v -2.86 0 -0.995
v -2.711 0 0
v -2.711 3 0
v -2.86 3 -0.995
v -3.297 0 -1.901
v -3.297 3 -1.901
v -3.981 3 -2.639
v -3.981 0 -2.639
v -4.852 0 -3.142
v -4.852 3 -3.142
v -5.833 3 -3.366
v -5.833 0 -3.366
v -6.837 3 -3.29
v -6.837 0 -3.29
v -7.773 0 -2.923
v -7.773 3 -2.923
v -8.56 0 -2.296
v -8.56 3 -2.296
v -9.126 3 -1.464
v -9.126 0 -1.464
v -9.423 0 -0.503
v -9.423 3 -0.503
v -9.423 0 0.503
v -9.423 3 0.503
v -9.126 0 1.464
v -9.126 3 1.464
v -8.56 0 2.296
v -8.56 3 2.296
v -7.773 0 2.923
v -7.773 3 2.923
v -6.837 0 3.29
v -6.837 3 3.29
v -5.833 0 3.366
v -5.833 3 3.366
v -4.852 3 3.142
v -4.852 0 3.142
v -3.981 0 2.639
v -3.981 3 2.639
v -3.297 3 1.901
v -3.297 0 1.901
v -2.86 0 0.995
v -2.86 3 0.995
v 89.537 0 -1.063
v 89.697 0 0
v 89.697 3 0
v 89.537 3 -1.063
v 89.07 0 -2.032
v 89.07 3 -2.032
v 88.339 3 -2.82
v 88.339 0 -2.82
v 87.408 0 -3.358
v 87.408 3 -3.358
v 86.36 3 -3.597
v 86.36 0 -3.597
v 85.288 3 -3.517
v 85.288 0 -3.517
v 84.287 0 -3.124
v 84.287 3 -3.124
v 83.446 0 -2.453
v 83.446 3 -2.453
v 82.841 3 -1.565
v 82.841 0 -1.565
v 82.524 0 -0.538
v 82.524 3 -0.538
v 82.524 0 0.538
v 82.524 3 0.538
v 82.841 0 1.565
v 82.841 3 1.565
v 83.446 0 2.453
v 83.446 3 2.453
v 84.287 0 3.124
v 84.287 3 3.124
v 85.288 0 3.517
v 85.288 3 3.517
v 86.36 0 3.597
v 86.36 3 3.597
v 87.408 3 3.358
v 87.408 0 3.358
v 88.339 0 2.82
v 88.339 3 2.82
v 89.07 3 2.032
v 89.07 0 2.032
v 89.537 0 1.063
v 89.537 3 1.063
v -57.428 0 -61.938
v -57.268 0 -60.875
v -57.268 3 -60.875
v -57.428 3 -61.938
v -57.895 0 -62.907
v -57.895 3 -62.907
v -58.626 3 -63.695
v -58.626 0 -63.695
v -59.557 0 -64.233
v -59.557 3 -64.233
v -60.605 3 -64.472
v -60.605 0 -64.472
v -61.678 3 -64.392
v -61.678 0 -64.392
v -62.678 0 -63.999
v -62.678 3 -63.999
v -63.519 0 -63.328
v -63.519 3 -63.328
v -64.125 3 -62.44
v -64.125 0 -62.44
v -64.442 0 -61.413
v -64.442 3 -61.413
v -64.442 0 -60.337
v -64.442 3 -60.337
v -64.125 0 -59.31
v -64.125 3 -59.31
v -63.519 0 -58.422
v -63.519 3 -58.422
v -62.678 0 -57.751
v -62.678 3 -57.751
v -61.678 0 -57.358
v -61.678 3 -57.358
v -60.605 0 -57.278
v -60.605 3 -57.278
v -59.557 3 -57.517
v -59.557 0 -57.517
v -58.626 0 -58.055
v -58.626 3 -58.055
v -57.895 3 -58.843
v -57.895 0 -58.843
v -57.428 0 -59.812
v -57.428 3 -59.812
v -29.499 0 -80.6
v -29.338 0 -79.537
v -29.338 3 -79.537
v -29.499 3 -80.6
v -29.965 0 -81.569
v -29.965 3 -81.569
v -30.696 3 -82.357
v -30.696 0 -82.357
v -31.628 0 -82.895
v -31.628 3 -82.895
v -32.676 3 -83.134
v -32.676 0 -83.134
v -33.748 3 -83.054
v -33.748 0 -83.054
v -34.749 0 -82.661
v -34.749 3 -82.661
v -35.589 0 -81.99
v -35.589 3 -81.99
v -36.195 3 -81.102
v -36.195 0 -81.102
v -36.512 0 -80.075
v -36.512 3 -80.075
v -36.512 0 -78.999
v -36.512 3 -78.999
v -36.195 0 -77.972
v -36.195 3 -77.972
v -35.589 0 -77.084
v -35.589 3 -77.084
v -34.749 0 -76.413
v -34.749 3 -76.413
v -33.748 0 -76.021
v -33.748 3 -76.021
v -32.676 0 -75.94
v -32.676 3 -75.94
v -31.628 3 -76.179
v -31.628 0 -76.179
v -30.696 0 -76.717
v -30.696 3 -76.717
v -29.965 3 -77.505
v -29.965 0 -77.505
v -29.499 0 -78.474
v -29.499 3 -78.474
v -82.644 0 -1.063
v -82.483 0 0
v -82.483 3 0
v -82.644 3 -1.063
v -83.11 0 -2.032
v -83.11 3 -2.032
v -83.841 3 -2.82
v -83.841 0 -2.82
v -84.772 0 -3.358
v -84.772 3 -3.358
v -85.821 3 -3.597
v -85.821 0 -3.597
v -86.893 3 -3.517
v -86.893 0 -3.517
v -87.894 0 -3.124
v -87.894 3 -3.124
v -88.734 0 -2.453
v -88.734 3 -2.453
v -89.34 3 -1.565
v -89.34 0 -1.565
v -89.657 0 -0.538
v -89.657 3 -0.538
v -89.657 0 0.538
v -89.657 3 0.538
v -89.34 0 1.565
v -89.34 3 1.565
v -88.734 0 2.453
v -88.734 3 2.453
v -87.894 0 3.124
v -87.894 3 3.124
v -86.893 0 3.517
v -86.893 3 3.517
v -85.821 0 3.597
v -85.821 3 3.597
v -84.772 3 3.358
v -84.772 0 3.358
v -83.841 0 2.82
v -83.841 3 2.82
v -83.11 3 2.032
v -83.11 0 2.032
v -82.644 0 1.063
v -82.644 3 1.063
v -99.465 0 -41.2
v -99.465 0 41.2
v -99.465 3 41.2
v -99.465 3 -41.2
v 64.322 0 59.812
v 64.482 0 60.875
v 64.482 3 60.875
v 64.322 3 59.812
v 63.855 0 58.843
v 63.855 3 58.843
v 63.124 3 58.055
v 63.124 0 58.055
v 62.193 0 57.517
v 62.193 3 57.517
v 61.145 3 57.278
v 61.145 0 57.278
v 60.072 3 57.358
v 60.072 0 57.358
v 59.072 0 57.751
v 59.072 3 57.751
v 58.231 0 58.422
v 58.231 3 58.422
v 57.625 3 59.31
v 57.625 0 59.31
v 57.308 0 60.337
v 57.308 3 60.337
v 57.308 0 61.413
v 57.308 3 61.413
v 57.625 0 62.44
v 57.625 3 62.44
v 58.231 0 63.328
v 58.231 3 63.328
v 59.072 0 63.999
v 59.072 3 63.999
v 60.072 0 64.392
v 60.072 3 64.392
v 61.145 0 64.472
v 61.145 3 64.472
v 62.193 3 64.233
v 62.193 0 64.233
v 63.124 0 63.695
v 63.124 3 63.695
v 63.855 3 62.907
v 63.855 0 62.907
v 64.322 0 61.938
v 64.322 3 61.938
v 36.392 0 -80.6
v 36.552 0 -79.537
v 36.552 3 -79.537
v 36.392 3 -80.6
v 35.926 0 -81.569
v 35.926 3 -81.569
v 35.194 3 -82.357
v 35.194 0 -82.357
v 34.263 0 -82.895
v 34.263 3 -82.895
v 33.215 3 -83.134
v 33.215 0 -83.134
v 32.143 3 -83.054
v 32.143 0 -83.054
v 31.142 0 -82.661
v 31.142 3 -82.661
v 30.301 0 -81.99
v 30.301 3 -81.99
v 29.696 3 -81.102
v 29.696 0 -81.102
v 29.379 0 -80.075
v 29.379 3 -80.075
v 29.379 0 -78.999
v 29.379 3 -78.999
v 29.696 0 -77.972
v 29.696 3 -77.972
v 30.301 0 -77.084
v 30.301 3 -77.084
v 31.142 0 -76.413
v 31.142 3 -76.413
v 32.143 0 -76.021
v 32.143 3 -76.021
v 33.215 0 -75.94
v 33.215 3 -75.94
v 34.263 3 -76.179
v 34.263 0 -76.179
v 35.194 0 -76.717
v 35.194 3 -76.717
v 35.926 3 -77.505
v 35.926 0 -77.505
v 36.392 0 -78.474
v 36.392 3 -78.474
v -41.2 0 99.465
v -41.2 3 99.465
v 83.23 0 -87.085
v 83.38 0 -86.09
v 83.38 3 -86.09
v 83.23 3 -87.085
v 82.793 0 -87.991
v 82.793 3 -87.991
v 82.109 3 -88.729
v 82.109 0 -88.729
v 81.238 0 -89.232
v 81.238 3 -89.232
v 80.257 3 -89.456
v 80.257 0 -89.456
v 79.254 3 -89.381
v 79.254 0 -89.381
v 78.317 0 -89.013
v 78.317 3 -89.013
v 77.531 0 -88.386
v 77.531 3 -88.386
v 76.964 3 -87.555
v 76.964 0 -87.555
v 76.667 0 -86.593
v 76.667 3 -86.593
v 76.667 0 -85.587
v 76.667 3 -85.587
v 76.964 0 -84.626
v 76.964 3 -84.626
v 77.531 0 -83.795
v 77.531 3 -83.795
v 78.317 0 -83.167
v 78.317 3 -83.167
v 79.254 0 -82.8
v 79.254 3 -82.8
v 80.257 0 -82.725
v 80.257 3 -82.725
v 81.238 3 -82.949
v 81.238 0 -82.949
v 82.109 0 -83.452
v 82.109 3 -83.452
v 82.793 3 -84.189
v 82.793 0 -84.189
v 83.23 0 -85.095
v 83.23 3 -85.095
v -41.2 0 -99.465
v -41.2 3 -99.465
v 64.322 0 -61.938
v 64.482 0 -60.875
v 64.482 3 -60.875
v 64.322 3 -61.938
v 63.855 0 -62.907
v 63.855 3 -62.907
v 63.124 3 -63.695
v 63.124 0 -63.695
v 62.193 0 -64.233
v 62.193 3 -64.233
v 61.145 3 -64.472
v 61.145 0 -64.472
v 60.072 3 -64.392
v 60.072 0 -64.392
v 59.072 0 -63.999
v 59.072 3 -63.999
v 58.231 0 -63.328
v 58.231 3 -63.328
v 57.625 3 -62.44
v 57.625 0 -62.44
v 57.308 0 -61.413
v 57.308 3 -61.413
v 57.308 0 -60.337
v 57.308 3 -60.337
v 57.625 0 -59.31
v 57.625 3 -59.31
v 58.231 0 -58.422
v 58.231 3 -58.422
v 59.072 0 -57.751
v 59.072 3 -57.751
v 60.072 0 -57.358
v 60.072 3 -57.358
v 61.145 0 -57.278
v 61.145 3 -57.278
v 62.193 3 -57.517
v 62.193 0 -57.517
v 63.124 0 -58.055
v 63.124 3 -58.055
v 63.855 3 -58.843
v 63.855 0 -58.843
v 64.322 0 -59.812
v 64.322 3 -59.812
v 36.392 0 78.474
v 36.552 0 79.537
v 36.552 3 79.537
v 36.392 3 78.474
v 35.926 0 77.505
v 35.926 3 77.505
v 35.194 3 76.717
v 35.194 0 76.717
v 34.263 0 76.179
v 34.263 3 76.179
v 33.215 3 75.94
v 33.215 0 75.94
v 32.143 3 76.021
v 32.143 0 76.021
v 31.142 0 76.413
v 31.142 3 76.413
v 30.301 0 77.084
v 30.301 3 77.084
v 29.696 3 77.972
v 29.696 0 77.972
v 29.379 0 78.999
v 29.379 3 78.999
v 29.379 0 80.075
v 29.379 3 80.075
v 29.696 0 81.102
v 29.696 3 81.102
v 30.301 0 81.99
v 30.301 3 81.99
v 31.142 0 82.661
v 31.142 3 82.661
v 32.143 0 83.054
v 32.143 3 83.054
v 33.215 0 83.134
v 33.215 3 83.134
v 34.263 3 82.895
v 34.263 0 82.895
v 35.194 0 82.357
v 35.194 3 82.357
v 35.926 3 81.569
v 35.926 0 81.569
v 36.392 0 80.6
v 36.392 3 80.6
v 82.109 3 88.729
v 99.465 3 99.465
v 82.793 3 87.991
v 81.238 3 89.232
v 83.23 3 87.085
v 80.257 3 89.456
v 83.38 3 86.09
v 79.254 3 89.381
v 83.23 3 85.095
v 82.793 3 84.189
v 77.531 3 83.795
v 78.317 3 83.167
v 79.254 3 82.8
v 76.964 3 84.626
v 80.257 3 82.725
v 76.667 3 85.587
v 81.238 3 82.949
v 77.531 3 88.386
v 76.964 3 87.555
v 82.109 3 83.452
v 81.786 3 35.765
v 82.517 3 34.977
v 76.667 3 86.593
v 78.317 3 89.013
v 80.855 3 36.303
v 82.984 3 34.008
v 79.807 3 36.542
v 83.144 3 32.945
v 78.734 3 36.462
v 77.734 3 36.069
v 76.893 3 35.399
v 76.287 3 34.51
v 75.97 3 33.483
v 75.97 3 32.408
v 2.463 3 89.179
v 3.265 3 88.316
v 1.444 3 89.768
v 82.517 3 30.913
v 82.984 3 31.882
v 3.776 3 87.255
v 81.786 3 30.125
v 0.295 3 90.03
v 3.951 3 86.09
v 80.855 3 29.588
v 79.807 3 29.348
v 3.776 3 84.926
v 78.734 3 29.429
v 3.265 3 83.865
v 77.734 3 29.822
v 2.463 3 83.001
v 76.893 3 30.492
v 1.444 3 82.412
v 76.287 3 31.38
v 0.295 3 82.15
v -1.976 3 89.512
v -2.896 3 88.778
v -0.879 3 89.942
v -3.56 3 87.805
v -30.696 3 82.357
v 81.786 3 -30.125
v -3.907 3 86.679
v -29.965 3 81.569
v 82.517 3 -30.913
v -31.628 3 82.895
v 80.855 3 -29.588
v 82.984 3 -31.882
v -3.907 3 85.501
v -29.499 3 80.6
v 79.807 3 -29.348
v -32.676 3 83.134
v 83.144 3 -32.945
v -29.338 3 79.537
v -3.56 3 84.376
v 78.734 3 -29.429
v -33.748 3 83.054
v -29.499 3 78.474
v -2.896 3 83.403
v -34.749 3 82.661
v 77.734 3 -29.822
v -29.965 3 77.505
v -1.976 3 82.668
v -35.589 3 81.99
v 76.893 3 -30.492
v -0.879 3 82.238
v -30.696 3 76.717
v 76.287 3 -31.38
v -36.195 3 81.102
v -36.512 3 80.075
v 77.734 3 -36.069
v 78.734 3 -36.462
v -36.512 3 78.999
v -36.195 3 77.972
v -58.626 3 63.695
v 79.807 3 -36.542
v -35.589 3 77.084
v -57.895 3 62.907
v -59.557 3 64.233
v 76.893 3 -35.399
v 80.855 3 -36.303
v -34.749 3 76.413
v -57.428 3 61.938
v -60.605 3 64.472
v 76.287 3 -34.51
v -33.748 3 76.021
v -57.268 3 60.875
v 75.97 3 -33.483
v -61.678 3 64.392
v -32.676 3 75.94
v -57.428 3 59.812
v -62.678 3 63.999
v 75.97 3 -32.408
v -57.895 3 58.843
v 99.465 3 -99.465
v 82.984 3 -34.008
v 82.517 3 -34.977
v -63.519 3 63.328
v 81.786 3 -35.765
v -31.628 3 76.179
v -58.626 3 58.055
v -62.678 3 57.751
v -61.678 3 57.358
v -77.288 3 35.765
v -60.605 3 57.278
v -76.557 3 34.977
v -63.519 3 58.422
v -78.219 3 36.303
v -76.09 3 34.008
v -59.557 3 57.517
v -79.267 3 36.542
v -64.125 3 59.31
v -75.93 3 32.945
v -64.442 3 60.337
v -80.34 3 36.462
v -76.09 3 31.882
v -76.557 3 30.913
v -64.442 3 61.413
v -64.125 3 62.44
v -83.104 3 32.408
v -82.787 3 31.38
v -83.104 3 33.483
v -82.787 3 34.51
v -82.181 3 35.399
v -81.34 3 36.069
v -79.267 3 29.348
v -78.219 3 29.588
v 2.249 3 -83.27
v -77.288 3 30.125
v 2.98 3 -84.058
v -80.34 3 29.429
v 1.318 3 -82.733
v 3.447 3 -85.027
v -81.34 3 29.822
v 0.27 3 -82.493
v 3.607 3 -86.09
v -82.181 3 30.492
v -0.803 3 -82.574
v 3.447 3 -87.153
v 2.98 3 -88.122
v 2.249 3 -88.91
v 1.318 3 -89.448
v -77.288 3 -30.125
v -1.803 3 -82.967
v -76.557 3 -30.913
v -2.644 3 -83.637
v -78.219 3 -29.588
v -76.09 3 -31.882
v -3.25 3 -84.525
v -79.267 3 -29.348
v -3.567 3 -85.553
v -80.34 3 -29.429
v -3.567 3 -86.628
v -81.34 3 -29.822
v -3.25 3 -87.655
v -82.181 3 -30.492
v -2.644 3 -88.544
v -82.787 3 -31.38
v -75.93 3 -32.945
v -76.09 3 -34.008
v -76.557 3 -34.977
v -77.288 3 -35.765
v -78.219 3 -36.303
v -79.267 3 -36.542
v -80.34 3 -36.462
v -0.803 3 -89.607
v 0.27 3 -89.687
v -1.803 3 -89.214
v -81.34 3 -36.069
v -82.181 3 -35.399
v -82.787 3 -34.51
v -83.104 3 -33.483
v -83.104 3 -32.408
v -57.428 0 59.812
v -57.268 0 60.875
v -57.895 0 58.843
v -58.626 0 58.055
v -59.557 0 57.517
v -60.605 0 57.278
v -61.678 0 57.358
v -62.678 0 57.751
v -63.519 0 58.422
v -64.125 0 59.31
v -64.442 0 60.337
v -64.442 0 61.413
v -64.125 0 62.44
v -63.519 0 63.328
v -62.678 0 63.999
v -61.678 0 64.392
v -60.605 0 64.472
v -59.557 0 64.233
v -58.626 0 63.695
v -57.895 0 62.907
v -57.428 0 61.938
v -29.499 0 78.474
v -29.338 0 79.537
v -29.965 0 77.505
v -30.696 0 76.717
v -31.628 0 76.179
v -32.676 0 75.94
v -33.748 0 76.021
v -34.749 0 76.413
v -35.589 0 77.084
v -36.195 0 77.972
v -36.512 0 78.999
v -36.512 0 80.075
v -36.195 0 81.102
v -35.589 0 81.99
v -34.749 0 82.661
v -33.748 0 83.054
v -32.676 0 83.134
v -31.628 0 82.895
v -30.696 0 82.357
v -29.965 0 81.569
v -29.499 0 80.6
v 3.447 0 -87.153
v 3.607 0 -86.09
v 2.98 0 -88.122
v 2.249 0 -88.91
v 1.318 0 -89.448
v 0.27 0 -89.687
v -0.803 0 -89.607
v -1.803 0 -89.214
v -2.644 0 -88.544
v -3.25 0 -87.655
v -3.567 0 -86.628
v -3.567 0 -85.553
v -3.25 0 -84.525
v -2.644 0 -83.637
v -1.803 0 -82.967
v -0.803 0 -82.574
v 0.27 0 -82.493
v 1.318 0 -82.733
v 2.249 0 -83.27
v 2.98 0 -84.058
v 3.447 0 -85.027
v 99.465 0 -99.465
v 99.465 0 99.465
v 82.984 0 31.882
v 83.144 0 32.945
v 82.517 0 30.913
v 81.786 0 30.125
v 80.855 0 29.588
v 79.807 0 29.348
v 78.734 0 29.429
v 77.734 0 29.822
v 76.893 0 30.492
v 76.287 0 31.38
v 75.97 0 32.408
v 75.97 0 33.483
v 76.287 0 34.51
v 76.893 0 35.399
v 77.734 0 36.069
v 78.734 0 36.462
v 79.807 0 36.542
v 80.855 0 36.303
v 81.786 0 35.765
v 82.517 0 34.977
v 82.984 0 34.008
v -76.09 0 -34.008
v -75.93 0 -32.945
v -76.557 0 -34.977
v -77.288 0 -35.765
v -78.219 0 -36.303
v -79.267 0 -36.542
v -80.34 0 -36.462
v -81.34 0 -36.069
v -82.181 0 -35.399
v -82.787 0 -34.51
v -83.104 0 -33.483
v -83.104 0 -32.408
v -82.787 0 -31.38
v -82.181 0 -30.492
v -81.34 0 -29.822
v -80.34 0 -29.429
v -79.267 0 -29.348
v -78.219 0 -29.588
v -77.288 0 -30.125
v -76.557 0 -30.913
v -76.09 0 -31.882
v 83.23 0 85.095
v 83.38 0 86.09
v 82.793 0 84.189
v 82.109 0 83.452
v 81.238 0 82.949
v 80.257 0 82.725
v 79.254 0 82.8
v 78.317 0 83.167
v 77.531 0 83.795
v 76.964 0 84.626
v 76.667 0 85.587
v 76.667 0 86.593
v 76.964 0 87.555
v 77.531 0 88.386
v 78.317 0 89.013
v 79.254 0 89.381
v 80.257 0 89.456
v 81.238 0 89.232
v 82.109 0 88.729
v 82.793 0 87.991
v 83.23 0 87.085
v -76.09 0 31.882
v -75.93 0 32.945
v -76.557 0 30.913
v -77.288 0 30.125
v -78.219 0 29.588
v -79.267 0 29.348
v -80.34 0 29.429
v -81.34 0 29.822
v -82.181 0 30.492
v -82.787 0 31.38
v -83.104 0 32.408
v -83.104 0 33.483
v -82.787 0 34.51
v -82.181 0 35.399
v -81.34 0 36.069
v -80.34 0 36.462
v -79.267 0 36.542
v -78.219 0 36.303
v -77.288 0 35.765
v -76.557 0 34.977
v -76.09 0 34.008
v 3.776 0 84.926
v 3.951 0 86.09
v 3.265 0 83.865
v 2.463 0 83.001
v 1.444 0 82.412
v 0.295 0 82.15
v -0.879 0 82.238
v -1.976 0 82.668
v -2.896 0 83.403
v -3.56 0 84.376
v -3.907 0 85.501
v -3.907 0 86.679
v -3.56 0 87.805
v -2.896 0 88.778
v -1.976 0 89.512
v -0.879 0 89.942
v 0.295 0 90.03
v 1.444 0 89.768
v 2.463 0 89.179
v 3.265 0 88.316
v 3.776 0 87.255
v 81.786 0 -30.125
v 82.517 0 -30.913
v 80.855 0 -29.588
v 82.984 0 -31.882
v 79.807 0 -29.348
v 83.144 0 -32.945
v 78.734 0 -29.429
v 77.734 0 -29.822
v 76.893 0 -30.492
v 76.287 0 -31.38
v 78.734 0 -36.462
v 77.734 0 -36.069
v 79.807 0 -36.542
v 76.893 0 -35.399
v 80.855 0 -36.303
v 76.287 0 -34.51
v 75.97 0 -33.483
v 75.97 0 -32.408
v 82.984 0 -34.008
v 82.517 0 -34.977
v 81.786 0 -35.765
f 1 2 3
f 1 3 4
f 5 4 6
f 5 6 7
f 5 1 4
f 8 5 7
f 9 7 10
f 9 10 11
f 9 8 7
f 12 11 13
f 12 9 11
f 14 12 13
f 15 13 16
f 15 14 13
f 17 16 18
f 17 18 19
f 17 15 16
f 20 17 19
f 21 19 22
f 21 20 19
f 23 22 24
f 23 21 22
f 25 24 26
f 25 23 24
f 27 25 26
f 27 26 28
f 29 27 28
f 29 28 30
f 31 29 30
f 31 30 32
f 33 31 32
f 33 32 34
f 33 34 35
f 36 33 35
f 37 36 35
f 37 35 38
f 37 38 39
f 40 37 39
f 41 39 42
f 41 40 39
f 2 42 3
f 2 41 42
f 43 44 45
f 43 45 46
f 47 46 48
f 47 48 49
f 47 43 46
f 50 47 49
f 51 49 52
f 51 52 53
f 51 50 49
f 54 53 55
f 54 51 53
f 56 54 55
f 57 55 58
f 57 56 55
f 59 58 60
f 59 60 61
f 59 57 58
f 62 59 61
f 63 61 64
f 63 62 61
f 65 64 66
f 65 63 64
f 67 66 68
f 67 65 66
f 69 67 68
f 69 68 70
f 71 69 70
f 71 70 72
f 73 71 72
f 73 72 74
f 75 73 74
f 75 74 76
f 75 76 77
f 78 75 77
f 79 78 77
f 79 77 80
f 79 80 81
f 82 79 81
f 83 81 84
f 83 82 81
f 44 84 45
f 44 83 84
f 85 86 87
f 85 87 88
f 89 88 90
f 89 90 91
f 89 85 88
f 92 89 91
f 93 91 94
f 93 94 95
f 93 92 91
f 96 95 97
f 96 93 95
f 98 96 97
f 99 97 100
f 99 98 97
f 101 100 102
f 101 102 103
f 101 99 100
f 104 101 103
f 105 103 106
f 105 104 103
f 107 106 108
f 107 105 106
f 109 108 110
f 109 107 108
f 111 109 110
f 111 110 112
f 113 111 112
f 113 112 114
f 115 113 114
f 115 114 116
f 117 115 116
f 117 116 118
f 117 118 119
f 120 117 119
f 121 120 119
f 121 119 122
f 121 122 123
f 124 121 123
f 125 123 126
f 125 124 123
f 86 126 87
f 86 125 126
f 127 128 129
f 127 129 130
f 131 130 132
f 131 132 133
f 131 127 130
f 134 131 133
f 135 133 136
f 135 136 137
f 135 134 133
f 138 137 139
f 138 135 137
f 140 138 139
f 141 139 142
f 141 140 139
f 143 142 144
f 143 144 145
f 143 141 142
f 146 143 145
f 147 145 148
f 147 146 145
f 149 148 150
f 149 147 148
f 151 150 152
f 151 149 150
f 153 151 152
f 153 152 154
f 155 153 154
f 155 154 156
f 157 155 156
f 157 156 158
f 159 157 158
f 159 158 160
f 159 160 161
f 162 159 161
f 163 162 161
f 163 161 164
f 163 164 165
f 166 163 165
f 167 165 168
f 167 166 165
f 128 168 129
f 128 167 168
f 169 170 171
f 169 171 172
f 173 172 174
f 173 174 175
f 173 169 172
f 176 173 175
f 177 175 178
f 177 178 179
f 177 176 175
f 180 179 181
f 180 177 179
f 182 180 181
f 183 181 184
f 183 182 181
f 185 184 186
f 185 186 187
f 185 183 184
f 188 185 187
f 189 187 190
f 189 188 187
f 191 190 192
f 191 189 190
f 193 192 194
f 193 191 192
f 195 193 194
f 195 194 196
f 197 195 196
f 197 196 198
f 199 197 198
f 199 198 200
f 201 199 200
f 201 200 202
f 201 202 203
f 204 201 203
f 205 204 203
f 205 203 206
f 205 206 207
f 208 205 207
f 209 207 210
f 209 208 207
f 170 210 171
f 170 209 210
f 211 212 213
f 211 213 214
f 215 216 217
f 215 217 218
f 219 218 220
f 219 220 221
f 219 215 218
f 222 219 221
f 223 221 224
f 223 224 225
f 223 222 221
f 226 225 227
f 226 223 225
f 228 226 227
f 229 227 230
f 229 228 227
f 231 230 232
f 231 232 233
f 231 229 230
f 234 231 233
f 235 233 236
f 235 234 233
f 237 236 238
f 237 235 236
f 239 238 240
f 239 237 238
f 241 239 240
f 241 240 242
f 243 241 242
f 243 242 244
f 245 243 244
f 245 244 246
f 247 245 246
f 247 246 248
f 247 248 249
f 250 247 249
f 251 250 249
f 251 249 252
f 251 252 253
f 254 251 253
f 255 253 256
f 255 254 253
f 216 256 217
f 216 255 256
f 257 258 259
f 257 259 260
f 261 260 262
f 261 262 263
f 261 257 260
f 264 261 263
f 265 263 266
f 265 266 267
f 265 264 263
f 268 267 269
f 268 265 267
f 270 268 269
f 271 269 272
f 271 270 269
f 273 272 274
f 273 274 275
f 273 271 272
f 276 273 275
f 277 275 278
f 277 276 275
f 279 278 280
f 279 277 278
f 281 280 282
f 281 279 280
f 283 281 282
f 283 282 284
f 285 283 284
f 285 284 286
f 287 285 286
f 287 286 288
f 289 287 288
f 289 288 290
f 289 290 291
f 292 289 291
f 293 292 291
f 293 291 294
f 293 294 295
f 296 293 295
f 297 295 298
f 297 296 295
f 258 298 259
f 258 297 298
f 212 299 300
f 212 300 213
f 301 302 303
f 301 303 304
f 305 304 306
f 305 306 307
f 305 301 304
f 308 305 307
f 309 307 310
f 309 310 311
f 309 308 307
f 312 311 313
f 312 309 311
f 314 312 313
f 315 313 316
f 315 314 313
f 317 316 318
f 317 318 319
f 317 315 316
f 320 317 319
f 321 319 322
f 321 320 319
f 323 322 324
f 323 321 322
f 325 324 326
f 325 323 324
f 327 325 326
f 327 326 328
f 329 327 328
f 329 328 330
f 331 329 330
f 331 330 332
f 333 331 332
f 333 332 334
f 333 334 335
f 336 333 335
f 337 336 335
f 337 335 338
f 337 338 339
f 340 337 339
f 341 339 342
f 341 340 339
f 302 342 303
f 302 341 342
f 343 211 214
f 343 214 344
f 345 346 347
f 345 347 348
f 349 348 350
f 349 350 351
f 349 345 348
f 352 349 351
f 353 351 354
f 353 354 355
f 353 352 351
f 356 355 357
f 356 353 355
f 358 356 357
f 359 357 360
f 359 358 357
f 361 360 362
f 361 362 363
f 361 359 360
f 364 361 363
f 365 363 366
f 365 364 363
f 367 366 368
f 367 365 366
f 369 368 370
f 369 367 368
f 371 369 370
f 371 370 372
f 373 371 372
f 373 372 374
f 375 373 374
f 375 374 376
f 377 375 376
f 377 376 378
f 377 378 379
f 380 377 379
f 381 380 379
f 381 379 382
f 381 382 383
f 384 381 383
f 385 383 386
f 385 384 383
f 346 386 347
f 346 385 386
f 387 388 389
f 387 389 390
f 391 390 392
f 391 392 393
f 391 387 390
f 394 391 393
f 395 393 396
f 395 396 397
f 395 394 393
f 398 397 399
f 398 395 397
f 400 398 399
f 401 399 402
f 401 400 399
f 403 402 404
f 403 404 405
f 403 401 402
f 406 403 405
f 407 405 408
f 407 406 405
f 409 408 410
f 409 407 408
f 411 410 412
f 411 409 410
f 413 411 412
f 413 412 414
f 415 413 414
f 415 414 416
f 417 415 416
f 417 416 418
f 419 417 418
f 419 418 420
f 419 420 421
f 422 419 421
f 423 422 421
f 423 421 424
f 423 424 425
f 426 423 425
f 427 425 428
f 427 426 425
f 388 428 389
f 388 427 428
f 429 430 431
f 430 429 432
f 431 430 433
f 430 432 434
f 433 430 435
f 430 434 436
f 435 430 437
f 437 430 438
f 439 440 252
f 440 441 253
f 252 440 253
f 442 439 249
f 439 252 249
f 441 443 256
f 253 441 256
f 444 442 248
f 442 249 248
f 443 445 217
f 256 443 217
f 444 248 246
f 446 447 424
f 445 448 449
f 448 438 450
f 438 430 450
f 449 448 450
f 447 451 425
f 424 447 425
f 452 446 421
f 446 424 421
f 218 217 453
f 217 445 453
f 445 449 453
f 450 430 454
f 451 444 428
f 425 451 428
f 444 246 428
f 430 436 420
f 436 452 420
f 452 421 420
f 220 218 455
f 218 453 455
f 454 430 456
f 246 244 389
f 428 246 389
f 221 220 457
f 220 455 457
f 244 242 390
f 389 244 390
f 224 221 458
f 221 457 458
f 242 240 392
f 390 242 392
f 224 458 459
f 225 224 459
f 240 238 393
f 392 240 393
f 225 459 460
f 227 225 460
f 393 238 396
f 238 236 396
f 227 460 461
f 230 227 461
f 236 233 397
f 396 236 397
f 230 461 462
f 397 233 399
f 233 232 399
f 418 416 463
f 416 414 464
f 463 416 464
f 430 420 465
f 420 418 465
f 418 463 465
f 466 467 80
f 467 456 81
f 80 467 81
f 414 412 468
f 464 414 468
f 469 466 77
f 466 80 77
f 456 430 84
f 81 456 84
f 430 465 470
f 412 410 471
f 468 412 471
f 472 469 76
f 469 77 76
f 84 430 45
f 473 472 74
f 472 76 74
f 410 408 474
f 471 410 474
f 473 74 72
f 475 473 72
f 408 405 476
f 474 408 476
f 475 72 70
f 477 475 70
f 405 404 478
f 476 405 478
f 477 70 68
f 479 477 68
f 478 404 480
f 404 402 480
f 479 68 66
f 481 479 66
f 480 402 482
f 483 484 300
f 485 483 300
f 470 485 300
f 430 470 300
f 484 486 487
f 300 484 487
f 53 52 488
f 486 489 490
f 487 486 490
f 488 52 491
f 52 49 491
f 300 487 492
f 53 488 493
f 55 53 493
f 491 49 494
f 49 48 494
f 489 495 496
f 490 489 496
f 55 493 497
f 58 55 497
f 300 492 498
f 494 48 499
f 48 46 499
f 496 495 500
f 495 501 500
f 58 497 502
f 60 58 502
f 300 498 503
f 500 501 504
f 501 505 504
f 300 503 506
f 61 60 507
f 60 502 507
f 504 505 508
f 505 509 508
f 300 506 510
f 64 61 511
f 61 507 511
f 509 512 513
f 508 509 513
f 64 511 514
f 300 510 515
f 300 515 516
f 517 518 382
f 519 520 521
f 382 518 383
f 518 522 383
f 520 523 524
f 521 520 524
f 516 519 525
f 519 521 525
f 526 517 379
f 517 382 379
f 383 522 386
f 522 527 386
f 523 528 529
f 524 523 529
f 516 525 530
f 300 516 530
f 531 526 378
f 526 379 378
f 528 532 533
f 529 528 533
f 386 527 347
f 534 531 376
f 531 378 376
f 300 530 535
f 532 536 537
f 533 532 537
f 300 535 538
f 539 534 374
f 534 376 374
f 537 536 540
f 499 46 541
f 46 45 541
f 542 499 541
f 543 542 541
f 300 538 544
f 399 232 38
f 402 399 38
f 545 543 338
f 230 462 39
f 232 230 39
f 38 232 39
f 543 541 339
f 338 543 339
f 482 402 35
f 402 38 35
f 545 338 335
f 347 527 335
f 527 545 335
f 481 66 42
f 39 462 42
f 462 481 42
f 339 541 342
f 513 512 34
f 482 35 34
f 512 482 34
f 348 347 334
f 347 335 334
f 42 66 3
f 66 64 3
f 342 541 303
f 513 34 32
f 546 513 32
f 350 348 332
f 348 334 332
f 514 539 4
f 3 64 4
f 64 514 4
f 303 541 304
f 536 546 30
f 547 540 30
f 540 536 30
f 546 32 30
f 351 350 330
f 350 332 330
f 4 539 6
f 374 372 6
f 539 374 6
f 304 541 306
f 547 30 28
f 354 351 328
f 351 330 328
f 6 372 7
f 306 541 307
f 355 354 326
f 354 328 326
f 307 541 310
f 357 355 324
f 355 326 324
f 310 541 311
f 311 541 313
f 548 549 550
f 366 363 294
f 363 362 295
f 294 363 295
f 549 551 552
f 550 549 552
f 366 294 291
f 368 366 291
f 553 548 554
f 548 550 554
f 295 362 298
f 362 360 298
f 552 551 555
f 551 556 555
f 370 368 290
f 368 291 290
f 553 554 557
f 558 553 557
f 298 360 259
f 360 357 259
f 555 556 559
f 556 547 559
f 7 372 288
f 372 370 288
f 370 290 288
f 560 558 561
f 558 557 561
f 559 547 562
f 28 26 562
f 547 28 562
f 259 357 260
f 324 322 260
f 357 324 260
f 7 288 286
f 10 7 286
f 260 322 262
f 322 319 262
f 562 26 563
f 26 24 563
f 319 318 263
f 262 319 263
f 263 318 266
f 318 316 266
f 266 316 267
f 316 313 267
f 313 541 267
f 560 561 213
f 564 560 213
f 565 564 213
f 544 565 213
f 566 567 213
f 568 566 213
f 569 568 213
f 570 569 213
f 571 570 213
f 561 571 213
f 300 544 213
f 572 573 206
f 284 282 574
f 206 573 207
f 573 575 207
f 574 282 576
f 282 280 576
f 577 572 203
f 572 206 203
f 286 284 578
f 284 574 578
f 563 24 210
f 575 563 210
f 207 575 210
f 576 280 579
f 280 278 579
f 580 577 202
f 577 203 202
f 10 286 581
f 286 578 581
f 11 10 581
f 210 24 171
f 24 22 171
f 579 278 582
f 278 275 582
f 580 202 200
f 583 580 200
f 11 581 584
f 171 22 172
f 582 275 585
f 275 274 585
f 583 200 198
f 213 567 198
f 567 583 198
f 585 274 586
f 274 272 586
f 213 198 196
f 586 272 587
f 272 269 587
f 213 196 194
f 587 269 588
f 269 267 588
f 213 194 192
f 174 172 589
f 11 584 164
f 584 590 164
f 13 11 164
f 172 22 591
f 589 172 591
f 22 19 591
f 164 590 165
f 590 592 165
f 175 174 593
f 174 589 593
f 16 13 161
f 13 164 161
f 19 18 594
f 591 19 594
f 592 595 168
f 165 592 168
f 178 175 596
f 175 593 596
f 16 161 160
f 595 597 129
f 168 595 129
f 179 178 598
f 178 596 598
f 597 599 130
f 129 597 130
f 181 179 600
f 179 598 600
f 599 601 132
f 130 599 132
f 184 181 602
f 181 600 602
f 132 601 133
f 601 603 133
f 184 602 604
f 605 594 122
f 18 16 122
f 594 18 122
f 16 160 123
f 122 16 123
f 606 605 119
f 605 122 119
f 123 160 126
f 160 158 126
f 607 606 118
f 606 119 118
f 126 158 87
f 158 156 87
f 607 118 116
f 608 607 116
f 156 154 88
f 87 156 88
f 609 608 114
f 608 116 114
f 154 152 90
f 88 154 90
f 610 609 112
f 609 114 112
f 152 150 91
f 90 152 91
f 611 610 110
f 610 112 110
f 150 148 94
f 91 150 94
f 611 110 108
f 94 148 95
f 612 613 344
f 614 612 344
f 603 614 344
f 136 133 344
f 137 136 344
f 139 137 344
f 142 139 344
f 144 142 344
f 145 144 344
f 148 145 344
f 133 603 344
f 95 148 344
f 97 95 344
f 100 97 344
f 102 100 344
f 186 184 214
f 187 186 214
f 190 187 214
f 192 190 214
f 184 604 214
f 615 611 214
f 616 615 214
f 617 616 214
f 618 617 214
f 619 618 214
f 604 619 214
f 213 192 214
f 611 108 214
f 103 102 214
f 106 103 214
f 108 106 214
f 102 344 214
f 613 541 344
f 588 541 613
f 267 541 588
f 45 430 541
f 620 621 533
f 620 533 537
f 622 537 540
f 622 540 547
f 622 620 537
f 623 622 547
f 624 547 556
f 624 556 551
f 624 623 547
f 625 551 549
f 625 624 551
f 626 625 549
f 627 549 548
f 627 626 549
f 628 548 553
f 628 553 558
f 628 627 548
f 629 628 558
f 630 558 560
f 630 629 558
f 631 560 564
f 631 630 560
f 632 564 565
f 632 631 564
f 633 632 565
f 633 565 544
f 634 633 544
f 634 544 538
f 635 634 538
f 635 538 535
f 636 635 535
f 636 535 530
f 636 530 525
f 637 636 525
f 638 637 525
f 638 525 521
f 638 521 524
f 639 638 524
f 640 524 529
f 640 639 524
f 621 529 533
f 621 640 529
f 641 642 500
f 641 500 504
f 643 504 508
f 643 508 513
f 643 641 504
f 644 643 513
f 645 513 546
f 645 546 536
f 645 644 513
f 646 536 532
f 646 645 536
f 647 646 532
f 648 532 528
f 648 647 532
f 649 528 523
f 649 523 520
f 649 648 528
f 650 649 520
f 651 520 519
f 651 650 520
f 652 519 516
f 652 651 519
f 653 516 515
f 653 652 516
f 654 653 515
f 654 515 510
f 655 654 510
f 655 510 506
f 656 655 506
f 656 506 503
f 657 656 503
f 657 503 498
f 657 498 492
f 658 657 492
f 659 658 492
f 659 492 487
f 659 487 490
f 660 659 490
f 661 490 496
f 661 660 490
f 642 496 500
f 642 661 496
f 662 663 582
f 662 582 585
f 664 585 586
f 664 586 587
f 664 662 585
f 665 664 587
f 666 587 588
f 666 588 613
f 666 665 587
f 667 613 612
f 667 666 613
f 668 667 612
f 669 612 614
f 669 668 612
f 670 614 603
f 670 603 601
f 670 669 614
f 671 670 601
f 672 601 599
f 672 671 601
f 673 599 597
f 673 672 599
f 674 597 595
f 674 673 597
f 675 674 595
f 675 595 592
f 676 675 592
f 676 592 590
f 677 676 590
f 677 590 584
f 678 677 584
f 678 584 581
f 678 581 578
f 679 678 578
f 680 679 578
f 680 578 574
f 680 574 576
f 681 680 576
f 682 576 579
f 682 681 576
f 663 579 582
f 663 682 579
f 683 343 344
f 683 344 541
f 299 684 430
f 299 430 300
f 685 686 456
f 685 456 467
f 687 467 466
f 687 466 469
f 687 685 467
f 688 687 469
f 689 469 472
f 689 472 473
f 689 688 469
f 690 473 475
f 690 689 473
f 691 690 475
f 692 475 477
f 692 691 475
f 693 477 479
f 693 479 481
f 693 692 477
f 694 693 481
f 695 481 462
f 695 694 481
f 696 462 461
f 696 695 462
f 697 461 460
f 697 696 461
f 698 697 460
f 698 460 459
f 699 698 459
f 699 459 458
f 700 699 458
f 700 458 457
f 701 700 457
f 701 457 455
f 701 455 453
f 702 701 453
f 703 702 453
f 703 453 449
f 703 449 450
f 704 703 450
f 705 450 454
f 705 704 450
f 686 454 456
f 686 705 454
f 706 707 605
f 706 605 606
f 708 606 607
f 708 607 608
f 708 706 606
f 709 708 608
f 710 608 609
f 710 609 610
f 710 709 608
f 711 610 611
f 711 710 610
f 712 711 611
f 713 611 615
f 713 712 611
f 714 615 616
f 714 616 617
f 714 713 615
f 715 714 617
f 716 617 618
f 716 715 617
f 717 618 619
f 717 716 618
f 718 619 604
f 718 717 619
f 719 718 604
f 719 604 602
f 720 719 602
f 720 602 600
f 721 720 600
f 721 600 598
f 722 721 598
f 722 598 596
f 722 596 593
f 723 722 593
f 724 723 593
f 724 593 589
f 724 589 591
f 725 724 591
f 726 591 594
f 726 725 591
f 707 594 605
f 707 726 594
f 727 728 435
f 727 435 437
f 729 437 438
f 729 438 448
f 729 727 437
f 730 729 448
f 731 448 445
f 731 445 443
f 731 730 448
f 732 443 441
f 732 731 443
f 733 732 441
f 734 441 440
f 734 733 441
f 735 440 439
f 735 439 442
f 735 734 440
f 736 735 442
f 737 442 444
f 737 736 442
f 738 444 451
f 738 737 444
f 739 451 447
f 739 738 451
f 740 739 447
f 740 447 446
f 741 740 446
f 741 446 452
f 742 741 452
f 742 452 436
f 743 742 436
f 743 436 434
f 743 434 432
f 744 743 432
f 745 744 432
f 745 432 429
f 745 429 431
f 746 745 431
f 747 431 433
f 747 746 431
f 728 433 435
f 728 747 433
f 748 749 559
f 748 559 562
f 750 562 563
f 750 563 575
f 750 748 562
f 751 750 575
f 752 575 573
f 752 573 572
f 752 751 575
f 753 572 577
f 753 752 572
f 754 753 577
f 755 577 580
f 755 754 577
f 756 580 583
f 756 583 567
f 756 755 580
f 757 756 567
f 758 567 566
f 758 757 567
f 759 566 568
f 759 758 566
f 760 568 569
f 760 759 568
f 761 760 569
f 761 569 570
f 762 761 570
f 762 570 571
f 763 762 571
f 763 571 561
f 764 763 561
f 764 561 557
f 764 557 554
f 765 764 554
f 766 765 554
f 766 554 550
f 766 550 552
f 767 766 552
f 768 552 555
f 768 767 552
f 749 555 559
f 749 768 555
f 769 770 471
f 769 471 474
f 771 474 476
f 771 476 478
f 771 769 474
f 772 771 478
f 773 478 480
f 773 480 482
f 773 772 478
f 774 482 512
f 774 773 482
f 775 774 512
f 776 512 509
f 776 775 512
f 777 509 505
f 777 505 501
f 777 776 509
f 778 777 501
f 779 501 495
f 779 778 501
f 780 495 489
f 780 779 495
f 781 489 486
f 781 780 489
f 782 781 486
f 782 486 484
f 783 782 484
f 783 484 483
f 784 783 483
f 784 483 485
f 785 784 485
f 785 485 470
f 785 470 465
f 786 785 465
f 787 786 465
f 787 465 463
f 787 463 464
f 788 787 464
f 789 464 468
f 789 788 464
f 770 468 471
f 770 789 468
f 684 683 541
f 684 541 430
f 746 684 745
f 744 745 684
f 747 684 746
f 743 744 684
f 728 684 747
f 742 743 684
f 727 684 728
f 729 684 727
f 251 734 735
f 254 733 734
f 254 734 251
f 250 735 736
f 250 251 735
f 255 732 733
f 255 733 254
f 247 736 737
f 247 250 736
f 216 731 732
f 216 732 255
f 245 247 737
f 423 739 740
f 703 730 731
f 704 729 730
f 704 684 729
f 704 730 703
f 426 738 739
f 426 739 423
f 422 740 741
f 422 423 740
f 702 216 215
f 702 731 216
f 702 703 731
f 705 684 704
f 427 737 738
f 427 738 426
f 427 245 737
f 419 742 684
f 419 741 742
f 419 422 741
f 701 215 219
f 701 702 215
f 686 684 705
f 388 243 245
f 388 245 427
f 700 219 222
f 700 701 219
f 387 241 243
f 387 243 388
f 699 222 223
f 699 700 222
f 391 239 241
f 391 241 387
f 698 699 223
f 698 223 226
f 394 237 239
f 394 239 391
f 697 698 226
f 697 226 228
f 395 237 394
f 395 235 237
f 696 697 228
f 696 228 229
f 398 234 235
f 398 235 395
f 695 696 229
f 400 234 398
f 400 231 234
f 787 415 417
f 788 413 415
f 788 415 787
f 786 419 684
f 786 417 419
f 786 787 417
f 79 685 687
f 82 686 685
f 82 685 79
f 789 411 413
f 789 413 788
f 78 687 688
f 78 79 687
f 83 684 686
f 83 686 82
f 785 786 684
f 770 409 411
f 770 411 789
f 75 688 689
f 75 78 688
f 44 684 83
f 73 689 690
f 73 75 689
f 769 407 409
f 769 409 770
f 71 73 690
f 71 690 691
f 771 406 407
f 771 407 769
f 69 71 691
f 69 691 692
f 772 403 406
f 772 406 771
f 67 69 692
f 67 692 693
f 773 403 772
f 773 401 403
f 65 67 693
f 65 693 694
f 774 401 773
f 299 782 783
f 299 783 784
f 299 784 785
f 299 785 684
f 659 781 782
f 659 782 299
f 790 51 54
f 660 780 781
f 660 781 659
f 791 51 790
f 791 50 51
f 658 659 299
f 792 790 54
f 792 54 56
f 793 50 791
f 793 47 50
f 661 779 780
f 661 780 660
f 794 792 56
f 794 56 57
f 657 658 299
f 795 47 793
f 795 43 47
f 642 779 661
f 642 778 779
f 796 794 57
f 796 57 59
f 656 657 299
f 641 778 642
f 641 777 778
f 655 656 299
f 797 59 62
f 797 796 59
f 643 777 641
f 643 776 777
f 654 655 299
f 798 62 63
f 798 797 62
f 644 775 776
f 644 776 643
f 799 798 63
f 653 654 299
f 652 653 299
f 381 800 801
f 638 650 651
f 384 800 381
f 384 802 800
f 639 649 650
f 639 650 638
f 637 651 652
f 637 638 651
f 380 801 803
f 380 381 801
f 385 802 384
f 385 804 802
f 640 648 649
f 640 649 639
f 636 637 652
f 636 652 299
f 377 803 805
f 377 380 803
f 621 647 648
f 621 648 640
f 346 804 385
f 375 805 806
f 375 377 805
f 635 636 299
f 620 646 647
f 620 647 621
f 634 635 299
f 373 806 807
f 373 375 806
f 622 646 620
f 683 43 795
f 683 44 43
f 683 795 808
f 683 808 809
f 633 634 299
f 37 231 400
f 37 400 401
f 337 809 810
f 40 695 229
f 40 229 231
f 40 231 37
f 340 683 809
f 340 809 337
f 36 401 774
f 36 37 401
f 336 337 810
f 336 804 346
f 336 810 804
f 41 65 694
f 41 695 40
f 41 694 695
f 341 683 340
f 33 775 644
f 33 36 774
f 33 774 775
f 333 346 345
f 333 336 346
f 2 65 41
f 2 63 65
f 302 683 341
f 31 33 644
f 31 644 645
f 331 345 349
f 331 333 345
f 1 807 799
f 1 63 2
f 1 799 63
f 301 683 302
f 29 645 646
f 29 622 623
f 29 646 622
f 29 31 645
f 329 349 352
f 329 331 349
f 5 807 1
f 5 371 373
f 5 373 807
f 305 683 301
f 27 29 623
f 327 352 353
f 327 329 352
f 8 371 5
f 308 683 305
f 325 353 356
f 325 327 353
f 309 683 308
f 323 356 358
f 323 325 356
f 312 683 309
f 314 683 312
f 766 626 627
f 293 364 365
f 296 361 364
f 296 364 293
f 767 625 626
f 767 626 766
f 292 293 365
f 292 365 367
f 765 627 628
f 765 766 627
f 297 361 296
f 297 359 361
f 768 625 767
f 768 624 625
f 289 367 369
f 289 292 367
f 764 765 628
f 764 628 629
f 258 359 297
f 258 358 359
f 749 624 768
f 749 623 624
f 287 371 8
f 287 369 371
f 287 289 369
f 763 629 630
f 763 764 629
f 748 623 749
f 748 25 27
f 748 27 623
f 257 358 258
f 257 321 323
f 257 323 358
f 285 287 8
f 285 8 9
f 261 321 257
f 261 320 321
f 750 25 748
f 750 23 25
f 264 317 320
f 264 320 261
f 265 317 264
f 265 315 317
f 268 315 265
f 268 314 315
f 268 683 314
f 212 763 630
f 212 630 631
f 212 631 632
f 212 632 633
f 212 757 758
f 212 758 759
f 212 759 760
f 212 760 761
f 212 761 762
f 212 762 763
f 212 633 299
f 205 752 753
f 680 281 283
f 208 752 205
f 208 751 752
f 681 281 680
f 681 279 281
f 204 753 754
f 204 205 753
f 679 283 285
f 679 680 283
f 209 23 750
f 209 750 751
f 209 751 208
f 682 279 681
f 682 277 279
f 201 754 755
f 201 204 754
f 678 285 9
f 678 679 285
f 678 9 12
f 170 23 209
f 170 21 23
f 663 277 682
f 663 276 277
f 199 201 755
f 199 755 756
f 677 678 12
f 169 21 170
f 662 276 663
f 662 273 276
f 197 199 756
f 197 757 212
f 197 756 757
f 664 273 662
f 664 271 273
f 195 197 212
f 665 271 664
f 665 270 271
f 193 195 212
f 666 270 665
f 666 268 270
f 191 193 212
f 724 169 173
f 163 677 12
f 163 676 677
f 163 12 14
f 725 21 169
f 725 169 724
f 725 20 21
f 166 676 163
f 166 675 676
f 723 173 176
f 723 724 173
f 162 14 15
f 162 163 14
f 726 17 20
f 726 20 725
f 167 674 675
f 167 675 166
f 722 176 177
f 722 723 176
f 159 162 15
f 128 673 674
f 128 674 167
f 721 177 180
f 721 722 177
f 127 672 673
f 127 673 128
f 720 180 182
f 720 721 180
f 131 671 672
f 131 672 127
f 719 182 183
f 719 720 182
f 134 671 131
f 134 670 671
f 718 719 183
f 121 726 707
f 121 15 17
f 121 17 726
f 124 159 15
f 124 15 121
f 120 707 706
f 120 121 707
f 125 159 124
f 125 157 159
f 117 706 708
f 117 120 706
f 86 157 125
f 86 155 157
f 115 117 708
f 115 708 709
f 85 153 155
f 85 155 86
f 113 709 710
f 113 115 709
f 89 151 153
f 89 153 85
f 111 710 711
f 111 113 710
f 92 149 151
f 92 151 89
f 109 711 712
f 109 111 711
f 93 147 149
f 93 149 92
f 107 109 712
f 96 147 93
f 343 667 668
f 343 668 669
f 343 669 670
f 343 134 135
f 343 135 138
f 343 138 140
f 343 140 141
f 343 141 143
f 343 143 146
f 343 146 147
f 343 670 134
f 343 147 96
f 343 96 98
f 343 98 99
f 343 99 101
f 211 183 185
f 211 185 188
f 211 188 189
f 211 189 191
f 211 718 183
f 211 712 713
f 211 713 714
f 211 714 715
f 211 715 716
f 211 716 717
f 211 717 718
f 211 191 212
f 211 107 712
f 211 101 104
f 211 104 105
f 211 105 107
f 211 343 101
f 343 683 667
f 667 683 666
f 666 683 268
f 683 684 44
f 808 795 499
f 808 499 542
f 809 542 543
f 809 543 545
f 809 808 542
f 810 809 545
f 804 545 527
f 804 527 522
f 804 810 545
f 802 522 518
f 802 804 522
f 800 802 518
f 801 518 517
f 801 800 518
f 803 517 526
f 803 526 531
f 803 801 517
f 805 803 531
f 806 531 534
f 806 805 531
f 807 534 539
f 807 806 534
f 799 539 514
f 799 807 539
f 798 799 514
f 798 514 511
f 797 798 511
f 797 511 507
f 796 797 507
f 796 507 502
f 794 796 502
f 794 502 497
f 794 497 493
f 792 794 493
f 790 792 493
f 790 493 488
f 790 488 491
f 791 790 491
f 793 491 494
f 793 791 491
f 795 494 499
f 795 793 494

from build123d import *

# Parameters (mm, degrees)
SKETCH1_R           = 3.374999999
SKETCH1_R_2         = 3.375000001
SKETCH1_R_3         = 3.375000002
SKETCH1_R_4         = 3.606945722
SKETCH1_R_5         = 3.951125178
BOSS_EXTRUDE1_DEPTH = 3


with BuildPart() as part:
    # Sketch1 → Boss-Extrude1 (new body)
    with BuildSketch(Plane(origin=(0, 0, 0), x_dir=(1, 0, 0), z_dir=(0, 1, 0))):
        Polygon((-41.199524293, -99.465227688), (-99.465227688, -41.199524293), (-99.465250609, 41.199501372), (-41.199524293, 99.465227688), (99.465250609, 99.465227688), (99.465250609, -99.465227688), align=None)
        with Locations((80.004750061, 86.09025128)):
            Circle(SKETCH1_R, mode=Mode.SUBTRACT)
        with Locations((-6.085500548, 6.7e-07)):
            Circle(SKETCH1_R_2, mode=Mode.SUBTRACT)
        with Locations((80.004750061, -86.090249939)):
            Circle(SKETCH1_R_3, mode=Mode.SUBTRACT)
        with Locations((-79.537020487, -32.945312596)):
            Circle(SKETCH1_R_4, mode=Mode.SUBTRACT)
        with Locations((-60.875, -60.875)):
            Circle(SKETCH1_R_4, mode=Mode.SUBTRACT)
        with Locations((-32.945312596, -79.537020487)):
            Circle(SKETCH1_R_4, mode=Mode.SUBTRACT)
        with Locations((32.945312596, -79.537020487)):
            Circle(SKETCH1_R_4, mode=Mode.SUBTRACT)
        with Locations((60.875, -60.875)):
            Circle(SKETCH1_R_4, mode=Mode.SUBTRACT)
        with Locations((79.537020487, -32.945312596)):
            Circle(SKETCH1_R_4, mode=Mode.SUBTRACT)
        with Locations((86.090250609, 0)):
            Circle(SKETCH1_R_4, mode=Mode.SUBTRACT)
        with Locations((79.537020487, 32.945312596)):
            Circle(SKETCH1_R_4, mode=Mode.SUBTRACT)
        with Locations((60.875, 60.875)):
            Circle(SKETCH1_R_4, mode=Mode.SUBTRACT)
        with Locations((32.945312596, 79.537020487)):
            Circle(SKETCH1_R_4, mode=Mode.SUBTRACT)
        with Locations((0, 86.090250609)):
            Circle(SKETCH1_R_4, mode=Mode.SUBTRACT)
        with Locations((-32.945312596, 79.537020487)):
            Circle(SKETCH1_R_4, mode=Mode.SUBTRACT)
        with Locations((-60.875, 60.875)):
            Circle(SKETCH1_R_4, mode=Mode.SUBTRACT)
        with Locations((-79.537020487, 32.945312596)):
            Circle(SKETCH1_R_4, mode=Mode.SUBTRACT)
        with Locations((-86.090250609, 0)):
            Circle(SKETCH1_R_4, mode=Mode.SUBTRACT)
        with Locations((0, -86.090250609)):
            Circle(SKETCH1_R_5, mode=Mode.SUBTRACT)
    extrude(amount=BOSS_EXTRUDE1_DEPTH)


solid = part.part
